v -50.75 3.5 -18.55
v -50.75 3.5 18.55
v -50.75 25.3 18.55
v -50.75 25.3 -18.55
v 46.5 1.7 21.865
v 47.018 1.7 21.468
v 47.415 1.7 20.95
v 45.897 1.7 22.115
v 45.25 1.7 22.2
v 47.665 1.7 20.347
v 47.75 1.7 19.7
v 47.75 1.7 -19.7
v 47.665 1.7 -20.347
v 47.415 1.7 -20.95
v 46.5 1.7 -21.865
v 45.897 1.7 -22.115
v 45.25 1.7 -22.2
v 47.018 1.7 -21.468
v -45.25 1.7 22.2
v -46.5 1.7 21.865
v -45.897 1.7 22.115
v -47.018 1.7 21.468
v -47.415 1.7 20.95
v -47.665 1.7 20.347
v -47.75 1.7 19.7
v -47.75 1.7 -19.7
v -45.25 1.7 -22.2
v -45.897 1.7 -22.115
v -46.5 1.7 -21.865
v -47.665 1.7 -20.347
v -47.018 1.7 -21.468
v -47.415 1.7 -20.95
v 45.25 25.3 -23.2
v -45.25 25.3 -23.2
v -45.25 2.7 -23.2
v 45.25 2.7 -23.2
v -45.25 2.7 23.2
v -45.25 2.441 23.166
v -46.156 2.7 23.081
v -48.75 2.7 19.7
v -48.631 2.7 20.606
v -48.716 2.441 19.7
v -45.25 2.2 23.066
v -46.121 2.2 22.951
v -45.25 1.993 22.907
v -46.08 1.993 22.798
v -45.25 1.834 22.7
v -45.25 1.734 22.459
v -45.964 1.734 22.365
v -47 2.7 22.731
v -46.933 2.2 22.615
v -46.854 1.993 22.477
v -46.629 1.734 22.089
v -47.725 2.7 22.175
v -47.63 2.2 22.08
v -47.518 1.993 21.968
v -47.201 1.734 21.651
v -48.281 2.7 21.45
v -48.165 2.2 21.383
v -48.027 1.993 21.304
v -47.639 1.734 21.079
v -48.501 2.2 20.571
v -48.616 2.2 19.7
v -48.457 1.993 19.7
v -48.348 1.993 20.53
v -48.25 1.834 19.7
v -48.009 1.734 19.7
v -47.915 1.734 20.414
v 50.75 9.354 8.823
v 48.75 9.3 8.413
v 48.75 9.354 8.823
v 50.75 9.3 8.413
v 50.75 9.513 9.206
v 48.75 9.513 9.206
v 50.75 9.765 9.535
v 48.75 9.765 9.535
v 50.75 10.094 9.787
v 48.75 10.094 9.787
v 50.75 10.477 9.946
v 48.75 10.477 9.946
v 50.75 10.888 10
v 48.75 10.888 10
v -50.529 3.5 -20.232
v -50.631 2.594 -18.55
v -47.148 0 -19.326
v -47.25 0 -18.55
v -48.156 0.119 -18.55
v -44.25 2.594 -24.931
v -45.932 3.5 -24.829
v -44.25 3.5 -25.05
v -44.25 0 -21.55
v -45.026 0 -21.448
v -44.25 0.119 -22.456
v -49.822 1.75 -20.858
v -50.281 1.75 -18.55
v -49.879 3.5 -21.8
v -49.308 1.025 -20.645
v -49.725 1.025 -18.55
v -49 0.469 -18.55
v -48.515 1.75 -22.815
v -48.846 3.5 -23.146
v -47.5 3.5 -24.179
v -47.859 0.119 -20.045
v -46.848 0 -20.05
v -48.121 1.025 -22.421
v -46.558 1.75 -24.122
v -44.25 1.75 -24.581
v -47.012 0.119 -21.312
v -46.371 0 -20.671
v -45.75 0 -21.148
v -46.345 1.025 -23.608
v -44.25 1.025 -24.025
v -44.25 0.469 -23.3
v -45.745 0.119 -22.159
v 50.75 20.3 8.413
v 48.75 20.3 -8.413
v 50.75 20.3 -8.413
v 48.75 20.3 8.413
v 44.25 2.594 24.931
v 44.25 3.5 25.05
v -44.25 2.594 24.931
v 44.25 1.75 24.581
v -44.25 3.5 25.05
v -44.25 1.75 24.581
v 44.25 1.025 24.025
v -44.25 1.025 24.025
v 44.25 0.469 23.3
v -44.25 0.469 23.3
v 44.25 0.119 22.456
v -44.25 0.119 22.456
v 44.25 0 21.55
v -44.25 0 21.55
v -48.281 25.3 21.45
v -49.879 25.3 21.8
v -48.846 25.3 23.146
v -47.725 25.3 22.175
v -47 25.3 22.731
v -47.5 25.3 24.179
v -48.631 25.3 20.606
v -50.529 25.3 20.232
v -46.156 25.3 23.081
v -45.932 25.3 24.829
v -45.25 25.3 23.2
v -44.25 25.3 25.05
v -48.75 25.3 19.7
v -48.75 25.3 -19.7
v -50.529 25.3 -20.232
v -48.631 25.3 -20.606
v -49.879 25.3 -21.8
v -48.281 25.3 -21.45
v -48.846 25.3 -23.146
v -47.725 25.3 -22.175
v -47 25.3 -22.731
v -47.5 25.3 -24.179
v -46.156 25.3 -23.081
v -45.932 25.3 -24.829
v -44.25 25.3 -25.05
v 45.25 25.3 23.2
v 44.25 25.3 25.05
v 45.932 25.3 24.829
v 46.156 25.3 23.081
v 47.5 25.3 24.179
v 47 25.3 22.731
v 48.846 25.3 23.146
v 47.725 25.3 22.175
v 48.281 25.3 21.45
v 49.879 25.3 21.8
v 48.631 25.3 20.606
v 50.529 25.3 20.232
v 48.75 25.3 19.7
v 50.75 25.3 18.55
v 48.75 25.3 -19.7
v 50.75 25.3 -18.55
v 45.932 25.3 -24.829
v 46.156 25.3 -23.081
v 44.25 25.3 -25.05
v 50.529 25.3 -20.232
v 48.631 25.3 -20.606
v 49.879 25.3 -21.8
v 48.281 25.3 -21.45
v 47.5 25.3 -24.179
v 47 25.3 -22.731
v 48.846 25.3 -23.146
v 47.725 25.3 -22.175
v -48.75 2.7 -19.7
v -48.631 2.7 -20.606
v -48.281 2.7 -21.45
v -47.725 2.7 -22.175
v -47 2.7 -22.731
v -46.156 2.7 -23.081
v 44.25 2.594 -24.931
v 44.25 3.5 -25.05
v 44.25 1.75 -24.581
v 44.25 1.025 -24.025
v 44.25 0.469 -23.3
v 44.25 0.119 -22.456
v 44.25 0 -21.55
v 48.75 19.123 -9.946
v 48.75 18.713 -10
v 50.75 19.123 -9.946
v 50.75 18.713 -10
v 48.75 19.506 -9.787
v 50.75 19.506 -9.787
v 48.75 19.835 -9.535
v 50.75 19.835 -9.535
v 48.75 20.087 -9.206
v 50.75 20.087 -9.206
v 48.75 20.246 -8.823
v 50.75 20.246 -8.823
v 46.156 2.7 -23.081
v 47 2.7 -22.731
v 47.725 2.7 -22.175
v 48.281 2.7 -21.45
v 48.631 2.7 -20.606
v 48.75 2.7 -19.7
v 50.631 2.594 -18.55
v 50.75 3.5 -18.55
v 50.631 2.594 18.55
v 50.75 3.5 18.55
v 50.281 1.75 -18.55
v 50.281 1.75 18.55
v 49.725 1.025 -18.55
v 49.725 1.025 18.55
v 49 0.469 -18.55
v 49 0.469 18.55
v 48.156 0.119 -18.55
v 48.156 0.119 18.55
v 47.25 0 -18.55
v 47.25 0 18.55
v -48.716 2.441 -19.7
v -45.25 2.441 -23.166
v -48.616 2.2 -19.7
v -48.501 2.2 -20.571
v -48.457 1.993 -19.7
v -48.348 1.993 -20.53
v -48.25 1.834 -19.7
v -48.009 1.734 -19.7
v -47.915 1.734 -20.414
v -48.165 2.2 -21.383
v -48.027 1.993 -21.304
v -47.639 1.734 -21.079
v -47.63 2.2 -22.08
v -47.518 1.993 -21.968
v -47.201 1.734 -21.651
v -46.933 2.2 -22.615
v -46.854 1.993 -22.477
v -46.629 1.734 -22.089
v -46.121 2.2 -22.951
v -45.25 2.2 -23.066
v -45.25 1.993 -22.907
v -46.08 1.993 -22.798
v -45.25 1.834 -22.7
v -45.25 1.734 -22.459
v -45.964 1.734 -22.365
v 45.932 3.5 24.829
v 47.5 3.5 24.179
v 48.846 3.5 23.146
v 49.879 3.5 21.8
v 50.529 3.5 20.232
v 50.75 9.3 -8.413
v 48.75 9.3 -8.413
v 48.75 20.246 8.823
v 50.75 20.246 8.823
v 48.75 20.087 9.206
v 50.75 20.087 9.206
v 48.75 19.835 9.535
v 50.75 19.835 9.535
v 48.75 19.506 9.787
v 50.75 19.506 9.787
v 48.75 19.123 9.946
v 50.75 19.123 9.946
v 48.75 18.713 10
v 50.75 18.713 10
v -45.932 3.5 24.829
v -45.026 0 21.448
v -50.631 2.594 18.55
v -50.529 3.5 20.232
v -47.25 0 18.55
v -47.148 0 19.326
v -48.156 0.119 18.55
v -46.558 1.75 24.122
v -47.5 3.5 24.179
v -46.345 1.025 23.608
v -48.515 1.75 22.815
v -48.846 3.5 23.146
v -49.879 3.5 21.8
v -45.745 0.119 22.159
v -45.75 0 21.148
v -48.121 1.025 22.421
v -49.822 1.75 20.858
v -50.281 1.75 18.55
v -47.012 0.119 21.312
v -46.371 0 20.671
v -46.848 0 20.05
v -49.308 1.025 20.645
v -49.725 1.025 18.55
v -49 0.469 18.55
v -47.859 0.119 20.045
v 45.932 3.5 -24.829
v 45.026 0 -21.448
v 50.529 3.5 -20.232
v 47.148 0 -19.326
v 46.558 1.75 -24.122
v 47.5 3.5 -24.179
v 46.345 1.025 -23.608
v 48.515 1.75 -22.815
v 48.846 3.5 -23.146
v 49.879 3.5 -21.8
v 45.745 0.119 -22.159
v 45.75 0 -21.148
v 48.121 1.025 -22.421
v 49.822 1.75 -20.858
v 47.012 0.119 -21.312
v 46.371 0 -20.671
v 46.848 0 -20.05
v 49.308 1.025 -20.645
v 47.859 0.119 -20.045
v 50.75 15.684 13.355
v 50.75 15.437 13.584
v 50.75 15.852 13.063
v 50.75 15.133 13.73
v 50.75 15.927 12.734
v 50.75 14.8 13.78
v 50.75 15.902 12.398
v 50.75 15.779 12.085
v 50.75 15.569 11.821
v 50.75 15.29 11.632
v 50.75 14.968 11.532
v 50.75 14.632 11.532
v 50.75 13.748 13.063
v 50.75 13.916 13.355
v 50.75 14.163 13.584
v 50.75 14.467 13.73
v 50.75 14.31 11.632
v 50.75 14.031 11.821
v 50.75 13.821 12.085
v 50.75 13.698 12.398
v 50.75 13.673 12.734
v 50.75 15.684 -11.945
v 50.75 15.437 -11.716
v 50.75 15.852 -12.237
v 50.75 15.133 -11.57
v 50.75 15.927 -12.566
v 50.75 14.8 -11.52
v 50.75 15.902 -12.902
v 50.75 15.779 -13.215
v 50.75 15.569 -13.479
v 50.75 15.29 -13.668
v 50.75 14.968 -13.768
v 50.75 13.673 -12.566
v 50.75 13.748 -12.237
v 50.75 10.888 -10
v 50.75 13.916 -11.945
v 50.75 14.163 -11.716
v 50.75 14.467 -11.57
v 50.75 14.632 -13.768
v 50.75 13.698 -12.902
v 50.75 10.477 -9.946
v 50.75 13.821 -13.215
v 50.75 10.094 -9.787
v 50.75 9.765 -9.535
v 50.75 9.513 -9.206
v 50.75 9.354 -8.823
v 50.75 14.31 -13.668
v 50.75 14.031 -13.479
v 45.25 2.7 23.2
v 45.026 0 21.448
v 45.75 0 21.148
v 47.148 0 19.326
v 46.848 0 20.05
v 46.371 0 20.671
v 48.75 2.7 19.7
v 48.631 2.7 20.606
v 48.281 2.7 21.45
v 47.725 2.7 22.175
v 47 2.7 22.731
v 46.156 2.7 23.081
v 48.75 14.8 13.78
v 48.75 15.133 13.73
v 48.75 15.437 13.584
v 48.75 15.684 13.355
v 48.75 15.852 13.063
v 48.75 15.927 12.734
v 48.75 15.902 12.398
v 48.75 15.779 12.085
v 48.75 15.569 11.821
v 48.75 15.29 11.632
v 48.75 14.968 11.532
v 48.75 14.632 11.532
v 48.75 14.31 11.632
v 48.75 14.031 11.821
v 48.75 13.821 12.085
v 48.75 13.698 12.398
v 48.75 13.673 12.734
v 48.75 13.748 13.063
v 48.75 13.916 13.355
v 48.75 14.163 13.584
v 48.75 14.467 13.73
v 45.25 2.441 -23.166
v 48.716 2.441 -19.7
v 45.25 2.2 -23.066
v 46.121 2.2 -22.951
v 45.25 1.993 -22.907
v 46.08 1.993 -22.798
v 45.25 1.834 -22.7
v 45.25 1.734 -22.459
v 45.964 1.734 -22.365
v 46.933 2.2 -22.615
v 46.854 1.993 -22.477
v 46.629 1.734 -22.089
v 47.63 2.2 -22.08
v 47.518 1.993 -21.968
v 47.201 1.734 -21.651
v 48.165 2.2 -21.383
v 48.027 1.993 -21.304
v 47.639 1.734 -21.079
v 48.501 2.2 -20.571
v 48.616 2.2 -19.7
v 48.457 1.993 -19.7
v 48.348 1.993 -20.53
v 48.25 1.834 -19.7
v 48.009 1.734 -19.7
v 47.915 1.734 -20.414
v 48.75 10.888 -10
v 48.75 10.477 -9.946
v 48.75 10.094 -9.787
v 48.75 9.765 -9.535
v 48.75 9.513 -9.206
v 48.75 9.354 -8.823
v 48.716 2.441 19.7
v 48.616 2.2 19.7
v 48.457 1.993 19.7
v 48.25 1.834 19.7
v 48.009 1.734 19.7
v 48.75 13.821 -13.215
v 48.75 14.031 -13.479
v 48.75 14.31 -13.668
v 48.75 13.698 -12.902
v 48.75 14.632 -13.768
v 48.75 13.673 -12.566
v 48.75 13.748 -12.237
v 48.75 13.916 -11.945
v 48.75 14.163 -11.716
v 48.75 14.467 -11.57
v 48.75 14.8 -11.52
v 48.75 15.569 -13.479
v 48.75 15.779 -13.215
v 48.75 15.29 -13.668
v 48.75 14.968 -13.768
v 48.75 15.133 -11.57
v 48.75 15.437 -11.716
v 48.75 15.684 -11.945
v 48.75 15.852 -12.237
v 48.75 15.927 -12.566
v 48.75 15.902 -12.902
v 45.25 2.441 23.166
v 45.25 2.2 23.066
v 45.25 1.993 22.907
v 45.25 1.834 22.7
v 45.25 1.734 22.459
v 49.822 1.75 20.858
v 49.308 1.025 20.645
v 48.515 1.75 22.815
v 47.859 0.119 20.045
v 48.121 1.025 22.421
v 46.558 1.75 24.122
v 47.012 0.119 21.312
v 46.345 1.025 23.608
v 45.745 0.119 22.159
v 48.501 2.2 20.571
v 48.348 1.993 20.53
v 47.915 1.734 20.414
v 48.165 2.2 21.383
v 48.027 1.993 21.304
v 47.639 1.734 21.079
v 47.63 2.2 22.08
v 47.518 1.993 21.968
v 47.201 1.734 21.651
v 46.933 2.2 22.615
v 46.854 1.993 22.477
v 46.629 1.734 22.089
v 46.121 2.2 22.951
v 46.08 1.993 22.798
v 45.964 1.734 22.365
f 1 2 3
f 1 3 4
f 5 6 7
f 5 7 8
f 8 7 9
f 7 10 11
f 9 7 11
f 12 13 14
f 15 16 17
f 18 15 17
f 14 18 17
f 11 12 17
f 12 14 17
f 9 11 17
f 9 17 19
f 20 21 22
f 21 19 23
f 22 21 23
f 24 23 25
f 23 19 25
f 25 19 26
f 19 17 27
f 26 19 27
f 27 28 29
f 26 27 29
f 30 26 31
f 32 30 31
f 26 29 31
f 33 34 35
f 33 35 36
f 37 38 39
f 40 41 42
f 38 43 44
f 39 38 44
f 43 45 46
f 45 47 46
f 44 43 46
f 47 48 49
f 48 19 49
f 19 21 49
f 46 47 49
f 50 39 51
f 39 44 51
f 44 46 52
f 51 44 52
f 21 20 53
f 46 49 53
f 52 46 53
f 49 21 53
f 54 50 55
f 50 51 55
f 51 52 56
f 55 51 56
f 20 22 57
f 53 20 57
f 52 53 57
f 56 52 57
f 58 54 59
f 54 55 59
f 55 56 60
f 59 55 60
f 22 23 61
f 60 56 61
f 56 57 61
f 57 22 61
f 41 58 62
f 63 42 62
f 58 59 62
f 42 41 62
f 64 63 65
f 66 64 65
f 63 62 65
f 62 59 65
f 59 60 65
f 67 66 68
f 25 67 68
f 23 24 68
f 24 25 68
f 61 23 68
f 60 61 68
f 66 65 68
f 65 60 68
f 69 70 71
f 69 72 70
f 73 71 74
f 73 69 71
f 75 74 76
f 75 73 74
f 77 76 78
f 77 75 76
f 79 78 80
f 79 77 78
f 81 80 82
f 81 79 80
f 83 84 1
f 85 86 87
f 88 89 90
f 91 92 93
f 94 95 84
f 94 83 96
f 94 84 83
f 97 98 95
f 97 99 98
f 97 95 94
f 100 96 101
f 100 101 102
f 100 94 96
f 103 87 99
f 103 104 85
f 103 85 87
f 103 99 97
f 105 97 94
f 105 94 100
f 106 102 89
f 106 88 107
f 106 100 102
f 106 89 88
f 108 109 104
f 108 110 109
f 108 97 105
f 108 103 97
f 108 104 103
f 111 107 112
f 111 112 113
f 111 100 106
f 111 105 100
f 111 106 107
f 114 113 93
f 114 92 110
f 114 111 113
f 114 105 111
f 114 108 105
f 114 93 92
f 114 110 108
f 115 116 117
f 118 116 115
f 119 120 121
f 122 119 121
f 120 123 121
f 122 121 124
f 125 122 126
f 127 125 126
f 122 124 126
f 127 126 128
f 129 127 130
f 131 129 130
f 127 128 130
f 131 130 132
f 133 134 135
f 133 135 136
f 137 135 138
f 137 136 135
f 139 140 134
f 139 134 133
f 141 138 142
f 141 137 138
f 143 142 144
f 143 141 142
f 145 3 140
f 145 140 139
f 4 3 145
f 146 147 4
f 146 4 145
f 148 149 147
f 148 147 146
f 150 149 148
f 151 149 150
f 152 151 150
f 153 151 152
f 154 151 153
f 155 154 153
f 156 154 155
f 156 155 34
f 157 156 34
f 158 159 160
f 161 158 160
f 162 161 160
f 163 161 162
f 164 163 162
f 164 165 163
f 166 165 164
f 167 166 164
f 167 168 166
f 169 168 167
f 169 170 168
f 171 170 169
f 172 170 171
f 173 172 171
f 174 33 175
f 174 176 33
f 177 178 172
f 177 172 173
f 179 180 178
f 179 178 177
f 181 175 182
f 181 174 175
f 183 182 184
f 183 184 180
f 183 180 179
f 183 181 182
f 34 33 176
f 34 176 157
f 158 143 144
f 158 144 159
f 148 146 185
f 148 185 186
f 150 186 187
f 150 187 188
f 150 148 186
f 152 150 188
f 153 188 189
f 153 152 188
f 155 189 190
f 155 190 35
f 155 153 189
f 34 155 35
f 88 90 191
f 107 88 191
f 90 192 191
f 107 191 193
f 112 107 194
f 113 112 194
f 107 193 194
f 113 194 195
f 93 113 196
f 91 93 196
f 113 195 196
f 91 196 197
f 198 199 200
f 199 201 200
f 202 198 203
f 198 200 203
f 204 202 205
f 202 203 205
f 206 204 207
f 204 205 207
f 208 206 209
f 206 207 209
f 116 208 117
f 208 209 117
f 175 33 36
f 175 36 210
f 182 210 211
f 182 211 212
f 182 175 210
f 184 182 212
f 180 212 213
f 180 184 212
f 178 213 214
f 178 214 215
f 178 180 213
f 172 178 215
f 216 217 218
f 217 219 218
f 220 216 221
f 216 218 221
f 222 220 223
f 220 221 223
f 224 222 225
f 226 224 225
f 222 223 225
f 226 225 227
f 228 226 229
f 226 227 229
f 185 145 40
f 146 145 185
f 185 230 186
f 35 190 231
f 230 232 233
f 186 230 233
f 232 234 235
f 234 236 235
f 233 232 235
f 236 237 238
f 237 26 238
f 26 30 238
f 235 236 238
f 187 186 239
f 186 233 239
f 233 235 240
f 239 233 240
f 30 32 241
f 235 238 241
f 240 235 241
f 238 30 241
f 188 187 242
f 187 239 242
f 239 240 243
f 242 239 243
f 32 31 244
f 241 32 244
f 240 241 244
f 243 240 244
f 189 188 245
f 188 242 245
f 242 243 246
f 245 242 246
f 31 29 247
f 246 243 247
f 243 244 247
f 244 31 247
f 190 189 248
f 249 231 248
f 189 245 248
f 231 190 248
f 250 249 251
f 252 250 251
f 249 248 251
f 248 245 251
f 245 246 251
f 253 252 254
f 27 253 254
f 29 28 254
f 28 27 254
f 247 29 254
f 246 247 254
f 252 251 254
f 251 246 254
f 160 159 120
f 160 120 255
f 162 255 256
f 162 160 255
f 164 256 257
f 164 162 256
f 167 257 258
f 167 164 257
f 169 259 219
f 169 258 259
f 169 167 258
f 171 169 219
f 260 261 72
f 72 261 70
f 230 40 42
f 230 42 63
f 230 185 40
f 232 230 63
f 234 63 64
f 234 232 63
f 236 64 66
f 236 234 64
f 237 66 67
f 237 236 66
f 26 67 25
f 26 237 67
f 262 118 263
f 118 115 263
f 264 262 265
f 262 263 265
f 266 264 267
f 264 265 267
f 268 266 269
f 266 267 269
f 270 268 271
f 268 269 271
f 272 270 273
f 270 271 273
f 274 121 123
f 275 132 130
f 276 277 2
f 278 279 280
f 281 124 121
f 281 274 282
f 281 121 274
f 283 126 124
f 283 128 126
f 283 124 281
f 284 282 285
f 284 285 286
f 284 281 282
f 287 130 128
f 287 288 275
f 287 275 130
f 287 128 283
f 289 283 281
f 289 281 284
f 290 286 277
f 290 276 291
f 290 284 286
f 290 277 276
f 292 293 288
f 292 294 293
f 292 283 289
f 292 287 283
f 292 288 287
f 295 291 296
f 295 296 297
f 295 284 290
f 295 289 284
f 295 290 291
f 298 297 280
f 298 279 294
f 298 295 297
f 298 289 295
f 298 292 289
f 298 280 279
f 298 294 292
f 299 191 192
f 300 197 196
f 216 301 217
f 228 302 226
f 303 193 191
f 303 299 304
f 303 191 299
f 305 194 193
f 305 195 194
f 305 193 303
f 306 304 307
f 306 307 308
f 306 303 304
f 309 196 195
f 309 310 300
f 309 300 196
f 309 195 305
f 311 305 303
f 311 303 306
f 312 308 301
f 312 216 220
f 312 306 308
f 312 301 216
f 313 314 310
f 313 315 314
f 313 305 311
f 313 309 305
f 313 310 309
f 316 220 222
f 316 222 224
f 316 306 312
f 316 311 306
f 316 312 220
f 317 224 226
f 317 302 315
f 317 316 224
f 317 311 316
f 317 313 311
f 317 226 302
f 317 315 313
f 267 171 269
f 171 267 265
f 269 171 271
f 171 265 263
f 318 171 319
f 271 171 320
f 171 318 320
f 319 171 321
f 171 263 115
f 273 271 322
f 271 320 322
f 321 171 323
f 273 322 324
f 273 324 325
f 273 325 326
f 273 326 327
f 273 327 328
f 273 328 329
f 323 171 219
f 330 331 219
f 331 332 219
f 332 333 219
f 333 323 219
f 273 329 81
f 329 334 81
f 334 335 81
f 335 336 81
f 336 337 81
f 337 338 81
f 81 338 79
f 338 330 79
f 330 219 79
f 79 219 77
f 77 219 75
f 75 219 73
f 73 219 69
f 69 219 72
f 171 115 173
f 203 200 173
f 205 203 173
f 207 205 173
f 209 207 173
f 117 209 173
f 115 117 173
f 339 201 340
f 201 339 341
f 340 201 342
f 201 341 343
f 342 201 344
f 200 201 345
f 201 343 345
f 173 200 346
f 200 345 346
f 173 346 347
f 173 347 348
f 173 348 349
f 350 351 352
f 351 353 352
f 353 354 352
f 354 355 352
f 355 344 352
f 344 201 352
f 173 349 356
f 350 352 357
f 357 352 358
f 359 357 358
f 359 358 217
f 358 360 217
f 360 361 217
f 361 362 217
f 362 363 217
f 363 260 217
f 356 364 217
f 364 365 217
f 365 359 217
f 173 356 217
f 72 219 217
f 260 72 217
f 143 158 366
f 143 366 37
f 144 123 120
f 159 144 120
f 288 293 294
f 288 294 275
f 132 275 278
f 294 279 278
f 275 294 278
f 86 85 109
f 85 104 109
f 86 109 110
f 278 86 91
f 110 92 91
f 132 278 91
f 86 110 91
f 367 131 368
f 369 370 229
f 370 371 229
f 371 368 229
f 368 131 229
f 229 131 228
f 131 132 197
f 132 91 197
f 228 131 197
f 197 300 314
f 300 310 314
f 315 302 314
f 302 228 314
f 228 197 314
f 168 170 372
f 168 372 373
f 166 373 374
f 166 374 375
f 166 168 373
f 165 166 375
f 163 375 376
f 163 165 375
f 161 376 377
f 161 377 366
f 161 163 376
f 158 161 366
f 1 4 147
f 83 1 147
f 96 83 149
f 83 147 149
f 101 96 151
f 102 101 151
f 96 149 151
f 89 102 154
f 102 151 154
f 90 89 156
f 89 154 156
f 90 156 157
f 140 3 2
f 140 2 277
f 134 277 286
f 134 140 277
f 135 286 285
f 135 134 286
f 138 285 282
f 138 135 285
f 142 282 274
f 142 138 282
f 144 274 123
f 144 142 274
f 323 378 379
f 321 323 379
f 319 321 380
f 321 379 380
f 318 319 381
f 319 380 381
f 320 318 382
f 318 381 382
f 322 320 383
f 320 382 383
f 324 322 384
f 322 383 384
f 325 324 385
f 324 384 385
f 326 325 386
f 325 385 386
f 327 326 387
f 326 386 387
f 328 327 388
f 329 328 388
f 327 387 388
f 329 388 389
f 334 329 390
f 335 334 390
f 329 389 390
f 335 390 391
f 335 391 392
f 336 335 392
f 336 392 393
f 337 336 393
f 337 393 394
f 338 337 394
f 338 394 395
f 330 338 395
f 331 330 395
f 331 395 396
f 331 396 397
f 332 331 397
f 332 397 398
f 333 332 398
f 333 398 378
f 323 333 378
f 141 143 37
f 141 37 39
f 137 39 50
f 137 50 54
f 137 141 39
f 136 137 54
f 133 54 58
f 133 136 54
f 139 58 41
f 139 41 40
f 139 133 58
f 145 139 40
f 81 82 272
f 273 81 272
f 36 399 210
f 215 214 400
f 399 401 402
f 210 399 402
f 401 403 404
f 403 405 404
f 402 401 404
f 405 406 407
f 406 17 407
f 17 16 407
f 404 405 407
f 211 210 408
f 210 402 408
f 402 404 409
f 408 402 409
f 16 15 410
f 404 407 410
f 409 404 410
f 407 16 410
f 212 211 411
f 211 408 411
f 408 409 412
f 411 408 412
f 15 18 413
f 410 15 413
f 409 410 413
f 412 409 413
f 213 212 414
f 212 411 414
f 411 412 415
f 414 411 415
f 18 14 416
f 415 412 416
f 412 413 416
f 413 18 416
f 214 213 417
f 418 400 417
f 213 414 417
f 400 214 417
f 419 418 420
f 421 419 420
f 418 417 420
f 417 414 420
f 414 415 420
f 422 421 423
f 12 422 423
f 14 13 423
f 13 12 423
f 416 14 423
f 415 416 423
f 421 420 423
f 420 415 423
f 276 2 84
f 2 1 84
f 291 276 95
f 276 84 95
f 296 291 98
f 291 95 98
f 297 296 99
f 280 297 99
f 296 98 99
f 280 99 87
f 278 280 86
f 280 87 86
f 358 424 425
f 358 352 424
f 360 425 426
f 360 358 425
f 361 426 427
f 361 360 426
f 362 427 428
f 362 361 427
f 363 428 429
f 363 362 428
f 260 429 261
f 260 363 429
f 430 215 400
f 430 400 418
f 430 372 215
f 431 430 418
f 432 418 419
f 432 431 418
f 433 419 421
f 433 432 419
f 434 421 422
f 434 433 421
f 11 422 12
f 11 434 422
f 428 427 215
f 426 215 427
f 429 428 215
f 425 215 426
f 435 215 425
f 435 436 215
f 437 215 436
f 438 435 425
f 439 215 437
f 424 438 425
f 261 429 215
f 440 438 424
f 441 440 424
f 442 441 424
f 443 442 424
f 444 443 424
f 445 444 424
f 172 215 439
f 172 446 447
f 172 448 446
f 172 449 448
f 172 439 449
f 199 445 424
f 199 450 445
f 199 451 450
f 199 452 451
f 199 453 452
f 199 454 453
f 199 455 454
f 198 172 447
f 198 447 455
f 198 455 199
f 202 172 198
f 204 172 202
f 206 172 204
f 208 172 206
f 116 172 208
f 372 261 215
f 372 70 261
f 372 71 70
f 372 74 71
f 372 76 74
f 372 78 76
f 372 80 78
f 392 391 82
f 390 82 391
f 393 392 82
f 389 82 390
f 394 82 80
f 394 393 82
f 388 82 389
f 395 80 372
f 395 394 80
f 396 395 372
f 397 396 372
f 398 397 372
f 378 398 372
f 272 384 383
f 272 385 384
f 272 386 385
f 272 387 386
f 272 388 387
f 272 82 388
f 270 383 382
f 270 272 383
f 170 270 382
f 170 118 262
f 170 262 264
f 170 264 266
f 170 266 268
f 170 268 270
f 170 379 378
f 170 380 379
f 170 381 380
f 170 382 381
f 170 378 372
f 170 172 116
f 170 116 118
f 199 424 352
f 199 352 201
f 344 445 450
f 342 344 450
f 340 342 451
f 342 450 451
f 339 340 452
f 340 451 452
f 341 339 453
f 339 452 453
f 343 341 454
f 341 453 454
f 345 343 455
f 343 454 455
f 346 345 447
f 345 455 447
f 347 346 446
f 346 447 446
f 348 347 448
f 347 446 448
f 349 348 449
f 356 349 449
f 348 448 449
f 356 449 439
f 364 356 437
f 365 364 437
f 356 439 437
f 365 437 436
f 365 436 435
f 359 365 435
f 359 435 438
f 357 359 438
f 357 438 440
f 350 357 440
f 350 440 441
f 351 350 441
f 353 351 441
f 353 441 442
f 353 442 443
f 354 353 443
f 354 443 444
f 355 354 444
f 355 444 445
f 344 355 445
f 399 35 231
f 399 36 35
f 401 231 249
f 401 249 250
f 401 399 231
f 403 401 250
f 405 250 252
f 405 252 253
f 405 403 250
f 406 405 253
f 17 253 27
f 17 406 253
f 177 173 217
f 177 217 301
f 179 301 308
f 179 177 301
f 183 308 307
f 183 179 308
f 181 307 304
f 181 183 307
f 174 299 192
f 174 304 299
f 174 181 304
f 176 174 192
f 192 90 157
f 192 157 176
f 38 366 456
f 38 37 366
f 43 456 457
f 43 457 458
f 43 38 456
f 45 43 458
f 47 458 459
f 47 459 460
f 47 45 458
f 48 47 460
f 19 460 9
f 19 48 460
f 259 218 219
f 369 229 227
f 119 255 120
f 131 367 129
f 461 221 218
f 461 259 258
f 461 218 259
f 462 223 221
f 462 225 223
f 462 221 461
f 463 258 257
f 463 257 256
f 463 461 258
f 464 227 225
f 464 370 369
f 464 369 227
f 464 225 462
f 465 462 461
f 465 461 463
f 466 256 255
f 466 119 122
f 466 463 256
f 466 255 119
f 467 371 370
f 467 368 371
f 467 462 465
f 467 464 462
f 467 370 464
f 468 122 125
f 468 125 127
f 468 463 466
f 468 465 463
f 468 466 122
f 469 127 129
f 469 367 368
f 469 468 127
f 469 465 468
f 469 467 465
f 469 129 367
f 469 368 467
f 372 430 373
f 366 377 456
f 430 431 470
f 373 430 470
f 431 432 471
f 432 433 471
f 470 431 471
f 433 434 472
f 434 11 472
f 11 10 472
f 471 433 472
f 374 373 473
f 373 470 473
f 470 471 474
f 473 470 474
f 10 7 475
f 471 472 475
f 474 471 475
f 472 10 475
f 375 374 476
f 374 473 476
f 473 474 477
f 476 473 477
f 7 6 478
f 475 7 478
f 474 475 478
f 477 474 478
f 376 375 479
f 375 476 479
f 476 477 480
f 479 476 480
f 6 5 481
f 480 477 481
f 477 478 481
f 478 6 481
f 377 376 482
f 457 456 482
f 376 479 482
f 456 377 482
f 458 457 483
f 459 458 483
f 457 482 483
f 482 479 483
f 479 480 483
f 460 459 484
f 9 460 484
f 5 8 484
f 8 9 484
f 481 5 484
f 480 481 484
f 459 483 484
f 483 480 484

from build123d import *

# Parameters (mm, degrees)
SKETCH1_W                     = 101.5
SKETCH1_H                     = 50.1
BOSS_EXTRUDE1_DEPTH           = 25.3
FILLET1_R                     = 6.5
FILLET2_R                     = 3.5
CUT_EXTRUDE1_DEPTH            = 23.6
FILLET3_R                     = 1
CUT_EXTRUDE2_REACH            = 107.678
SKETCH3_W                     = 20
SKETCH3_H                     = 11
TAP_DRILL_FOR_4_40_TAP1_D     = 2.2606
TAP_DRILL_FOR_4_40_TAP1_DEPTH = 2
F_1_8_END_MILL_R              = 1.5875


with BuildPart() as part:
    # Sketch1 → Boss-Extrude1 (new body)
    with BuildSketch(Plane(origin=(0, 0, 0), x_dir=(1, 0, 0), z_dir=(0, 1, 0))):
        Rectangle(SKETCH1_W, SKETCH1_H)
    extrude(amount=BOSS_EXTRUDE1_DEPTH)

    # Fillet1
    fillet1_edges = [part.edges().sort_by_distance(p)[0] for p in [
        (50.75, 12.65, 25.05),
        (-50.75, 12.65, 25.05),
        (-50.75, 12.65, -25.05),
        (50.75, 12.65, -25.05),
    ]]
    fillet(fillet1_edges, radius=FILLET1_R)

    # Fillet2
    fillet2_edges = [part.edges().sort_by_distance(p)[0] for p in [
        (-50.75, 0, 0),
        (50.75, 0, 0),
        (0, 0, 25.05),
        (0, 0, -25.05),
        (48.846194078, 0, 23.146194078),
        (-48.846194078, 0, 23.146194078),
        (48.846194078, 0, -23.146194078),
        (-48.846194078, 0, -23.146194078),
    ]]
    fillet(fillet2_edges, radius=FILLET2_R)

    # Sketch2 → Cut-Extrude1 (cut)
    with BuildSketch(Plane(origin=(0, 25.3, 0), x_dir=(1, 0, 0), z_dir=(0, 1, 0))):
        with BuildLine():
            Line((-45.25, 23.2), (45.25, 23.2))
            ThreePointArc((45.25, 23.2), (47.724873734, 22.174873734), (48.75, 19.7))
            Line((48.75, 19.7), (48.75, -19.7))
            ThreePointArc((48.75, -19.7), (47.724873734, -22.174873734), (45.25, -23.2))
            Line((45.25, -23.2), (-45.25, -23.2))
            ThreePointArc((-45.25, -23.2), (-47.724873734, -22.174873734), (-48.75, -19.7))
            Line((-48.75, -19.7), (-48.75, 19.7))
            ThreePointArc((-48.75, 19.7), (-47.724873734, 22.174873734), (-45.25, 23.2))
        make_face()
    extrude(amount=-CUT_EXTRUDE1_DEPTH, mode=Mode.SUBTRACT)

    # Fillet3
    fillet3_edges = [part.edges().sort_by_distance(p)[0] for p in [
        (47.724873734, 1.7, -22.174873734),
        (48.75, 1.7, 0),
        (47.724873734, 1.7, 22.174873734),
        (0, 1.7, 23.2),
        (-47.724873734, 1.7, 22.174873734),
        (-48.75, 1.7, 0),
        (-47.724873734, 1.7, -22.174873734),
        (0, 1.7, -23.2),
    ]]
    fillet(fillet3_edges, radius=FILLET3_R)

    # Sketch3 → Cut-Extrude2 (cut, up to next)
    with BuildSketch(Plane.ZY.offset(-48.75), mode=Mode.PRIVATE) as cut_extrude2_sk1:
        with Locations((0, 14.8)):
            Rectangle(SKETCH3_W, SKETCH3_H)
    cut_extrude2_tool1 = extrude(cut_extrude2_sk1.sketch, amount=-CUT_EXTRUDE2_REACH, mode=Mode.PRIVATE) & part.part
    add(cut_extrude2_tool1.solids().sort_by_distance((48.75, 14.8, 0))[0], mode=Mode.SUBTRACT)

    # Tap Drill for #4-40 Tap1
    with Locations(Plane(origin=(50.75, 0, 0), x_dir=(0, 0, -1), z_dir=(1, 0, 0))):
        with Locations((-12.65, 14.8), (12.65, 14.8)):
            Hole(TAP_DRILL_FOR_4_40_TAP1_D / 2, depth=TAP_DRILL_FOR_4_40_TAP1_DEPTH)

    # 1/8" end mill
    f_1_8_end_mill_edges = [part.edges().sort_by_distance(p)[0] for p in [
        (49.75, 20.3, -10),
        (49.75, 20.3, 10),
        (49.75, 9.3, 10),
        (49.75, 9.3, -10),
    ]]
    fillet(f_1_8_end_mill_edges, radius=F_1_8_END_MILL_R)


solid = part.part
